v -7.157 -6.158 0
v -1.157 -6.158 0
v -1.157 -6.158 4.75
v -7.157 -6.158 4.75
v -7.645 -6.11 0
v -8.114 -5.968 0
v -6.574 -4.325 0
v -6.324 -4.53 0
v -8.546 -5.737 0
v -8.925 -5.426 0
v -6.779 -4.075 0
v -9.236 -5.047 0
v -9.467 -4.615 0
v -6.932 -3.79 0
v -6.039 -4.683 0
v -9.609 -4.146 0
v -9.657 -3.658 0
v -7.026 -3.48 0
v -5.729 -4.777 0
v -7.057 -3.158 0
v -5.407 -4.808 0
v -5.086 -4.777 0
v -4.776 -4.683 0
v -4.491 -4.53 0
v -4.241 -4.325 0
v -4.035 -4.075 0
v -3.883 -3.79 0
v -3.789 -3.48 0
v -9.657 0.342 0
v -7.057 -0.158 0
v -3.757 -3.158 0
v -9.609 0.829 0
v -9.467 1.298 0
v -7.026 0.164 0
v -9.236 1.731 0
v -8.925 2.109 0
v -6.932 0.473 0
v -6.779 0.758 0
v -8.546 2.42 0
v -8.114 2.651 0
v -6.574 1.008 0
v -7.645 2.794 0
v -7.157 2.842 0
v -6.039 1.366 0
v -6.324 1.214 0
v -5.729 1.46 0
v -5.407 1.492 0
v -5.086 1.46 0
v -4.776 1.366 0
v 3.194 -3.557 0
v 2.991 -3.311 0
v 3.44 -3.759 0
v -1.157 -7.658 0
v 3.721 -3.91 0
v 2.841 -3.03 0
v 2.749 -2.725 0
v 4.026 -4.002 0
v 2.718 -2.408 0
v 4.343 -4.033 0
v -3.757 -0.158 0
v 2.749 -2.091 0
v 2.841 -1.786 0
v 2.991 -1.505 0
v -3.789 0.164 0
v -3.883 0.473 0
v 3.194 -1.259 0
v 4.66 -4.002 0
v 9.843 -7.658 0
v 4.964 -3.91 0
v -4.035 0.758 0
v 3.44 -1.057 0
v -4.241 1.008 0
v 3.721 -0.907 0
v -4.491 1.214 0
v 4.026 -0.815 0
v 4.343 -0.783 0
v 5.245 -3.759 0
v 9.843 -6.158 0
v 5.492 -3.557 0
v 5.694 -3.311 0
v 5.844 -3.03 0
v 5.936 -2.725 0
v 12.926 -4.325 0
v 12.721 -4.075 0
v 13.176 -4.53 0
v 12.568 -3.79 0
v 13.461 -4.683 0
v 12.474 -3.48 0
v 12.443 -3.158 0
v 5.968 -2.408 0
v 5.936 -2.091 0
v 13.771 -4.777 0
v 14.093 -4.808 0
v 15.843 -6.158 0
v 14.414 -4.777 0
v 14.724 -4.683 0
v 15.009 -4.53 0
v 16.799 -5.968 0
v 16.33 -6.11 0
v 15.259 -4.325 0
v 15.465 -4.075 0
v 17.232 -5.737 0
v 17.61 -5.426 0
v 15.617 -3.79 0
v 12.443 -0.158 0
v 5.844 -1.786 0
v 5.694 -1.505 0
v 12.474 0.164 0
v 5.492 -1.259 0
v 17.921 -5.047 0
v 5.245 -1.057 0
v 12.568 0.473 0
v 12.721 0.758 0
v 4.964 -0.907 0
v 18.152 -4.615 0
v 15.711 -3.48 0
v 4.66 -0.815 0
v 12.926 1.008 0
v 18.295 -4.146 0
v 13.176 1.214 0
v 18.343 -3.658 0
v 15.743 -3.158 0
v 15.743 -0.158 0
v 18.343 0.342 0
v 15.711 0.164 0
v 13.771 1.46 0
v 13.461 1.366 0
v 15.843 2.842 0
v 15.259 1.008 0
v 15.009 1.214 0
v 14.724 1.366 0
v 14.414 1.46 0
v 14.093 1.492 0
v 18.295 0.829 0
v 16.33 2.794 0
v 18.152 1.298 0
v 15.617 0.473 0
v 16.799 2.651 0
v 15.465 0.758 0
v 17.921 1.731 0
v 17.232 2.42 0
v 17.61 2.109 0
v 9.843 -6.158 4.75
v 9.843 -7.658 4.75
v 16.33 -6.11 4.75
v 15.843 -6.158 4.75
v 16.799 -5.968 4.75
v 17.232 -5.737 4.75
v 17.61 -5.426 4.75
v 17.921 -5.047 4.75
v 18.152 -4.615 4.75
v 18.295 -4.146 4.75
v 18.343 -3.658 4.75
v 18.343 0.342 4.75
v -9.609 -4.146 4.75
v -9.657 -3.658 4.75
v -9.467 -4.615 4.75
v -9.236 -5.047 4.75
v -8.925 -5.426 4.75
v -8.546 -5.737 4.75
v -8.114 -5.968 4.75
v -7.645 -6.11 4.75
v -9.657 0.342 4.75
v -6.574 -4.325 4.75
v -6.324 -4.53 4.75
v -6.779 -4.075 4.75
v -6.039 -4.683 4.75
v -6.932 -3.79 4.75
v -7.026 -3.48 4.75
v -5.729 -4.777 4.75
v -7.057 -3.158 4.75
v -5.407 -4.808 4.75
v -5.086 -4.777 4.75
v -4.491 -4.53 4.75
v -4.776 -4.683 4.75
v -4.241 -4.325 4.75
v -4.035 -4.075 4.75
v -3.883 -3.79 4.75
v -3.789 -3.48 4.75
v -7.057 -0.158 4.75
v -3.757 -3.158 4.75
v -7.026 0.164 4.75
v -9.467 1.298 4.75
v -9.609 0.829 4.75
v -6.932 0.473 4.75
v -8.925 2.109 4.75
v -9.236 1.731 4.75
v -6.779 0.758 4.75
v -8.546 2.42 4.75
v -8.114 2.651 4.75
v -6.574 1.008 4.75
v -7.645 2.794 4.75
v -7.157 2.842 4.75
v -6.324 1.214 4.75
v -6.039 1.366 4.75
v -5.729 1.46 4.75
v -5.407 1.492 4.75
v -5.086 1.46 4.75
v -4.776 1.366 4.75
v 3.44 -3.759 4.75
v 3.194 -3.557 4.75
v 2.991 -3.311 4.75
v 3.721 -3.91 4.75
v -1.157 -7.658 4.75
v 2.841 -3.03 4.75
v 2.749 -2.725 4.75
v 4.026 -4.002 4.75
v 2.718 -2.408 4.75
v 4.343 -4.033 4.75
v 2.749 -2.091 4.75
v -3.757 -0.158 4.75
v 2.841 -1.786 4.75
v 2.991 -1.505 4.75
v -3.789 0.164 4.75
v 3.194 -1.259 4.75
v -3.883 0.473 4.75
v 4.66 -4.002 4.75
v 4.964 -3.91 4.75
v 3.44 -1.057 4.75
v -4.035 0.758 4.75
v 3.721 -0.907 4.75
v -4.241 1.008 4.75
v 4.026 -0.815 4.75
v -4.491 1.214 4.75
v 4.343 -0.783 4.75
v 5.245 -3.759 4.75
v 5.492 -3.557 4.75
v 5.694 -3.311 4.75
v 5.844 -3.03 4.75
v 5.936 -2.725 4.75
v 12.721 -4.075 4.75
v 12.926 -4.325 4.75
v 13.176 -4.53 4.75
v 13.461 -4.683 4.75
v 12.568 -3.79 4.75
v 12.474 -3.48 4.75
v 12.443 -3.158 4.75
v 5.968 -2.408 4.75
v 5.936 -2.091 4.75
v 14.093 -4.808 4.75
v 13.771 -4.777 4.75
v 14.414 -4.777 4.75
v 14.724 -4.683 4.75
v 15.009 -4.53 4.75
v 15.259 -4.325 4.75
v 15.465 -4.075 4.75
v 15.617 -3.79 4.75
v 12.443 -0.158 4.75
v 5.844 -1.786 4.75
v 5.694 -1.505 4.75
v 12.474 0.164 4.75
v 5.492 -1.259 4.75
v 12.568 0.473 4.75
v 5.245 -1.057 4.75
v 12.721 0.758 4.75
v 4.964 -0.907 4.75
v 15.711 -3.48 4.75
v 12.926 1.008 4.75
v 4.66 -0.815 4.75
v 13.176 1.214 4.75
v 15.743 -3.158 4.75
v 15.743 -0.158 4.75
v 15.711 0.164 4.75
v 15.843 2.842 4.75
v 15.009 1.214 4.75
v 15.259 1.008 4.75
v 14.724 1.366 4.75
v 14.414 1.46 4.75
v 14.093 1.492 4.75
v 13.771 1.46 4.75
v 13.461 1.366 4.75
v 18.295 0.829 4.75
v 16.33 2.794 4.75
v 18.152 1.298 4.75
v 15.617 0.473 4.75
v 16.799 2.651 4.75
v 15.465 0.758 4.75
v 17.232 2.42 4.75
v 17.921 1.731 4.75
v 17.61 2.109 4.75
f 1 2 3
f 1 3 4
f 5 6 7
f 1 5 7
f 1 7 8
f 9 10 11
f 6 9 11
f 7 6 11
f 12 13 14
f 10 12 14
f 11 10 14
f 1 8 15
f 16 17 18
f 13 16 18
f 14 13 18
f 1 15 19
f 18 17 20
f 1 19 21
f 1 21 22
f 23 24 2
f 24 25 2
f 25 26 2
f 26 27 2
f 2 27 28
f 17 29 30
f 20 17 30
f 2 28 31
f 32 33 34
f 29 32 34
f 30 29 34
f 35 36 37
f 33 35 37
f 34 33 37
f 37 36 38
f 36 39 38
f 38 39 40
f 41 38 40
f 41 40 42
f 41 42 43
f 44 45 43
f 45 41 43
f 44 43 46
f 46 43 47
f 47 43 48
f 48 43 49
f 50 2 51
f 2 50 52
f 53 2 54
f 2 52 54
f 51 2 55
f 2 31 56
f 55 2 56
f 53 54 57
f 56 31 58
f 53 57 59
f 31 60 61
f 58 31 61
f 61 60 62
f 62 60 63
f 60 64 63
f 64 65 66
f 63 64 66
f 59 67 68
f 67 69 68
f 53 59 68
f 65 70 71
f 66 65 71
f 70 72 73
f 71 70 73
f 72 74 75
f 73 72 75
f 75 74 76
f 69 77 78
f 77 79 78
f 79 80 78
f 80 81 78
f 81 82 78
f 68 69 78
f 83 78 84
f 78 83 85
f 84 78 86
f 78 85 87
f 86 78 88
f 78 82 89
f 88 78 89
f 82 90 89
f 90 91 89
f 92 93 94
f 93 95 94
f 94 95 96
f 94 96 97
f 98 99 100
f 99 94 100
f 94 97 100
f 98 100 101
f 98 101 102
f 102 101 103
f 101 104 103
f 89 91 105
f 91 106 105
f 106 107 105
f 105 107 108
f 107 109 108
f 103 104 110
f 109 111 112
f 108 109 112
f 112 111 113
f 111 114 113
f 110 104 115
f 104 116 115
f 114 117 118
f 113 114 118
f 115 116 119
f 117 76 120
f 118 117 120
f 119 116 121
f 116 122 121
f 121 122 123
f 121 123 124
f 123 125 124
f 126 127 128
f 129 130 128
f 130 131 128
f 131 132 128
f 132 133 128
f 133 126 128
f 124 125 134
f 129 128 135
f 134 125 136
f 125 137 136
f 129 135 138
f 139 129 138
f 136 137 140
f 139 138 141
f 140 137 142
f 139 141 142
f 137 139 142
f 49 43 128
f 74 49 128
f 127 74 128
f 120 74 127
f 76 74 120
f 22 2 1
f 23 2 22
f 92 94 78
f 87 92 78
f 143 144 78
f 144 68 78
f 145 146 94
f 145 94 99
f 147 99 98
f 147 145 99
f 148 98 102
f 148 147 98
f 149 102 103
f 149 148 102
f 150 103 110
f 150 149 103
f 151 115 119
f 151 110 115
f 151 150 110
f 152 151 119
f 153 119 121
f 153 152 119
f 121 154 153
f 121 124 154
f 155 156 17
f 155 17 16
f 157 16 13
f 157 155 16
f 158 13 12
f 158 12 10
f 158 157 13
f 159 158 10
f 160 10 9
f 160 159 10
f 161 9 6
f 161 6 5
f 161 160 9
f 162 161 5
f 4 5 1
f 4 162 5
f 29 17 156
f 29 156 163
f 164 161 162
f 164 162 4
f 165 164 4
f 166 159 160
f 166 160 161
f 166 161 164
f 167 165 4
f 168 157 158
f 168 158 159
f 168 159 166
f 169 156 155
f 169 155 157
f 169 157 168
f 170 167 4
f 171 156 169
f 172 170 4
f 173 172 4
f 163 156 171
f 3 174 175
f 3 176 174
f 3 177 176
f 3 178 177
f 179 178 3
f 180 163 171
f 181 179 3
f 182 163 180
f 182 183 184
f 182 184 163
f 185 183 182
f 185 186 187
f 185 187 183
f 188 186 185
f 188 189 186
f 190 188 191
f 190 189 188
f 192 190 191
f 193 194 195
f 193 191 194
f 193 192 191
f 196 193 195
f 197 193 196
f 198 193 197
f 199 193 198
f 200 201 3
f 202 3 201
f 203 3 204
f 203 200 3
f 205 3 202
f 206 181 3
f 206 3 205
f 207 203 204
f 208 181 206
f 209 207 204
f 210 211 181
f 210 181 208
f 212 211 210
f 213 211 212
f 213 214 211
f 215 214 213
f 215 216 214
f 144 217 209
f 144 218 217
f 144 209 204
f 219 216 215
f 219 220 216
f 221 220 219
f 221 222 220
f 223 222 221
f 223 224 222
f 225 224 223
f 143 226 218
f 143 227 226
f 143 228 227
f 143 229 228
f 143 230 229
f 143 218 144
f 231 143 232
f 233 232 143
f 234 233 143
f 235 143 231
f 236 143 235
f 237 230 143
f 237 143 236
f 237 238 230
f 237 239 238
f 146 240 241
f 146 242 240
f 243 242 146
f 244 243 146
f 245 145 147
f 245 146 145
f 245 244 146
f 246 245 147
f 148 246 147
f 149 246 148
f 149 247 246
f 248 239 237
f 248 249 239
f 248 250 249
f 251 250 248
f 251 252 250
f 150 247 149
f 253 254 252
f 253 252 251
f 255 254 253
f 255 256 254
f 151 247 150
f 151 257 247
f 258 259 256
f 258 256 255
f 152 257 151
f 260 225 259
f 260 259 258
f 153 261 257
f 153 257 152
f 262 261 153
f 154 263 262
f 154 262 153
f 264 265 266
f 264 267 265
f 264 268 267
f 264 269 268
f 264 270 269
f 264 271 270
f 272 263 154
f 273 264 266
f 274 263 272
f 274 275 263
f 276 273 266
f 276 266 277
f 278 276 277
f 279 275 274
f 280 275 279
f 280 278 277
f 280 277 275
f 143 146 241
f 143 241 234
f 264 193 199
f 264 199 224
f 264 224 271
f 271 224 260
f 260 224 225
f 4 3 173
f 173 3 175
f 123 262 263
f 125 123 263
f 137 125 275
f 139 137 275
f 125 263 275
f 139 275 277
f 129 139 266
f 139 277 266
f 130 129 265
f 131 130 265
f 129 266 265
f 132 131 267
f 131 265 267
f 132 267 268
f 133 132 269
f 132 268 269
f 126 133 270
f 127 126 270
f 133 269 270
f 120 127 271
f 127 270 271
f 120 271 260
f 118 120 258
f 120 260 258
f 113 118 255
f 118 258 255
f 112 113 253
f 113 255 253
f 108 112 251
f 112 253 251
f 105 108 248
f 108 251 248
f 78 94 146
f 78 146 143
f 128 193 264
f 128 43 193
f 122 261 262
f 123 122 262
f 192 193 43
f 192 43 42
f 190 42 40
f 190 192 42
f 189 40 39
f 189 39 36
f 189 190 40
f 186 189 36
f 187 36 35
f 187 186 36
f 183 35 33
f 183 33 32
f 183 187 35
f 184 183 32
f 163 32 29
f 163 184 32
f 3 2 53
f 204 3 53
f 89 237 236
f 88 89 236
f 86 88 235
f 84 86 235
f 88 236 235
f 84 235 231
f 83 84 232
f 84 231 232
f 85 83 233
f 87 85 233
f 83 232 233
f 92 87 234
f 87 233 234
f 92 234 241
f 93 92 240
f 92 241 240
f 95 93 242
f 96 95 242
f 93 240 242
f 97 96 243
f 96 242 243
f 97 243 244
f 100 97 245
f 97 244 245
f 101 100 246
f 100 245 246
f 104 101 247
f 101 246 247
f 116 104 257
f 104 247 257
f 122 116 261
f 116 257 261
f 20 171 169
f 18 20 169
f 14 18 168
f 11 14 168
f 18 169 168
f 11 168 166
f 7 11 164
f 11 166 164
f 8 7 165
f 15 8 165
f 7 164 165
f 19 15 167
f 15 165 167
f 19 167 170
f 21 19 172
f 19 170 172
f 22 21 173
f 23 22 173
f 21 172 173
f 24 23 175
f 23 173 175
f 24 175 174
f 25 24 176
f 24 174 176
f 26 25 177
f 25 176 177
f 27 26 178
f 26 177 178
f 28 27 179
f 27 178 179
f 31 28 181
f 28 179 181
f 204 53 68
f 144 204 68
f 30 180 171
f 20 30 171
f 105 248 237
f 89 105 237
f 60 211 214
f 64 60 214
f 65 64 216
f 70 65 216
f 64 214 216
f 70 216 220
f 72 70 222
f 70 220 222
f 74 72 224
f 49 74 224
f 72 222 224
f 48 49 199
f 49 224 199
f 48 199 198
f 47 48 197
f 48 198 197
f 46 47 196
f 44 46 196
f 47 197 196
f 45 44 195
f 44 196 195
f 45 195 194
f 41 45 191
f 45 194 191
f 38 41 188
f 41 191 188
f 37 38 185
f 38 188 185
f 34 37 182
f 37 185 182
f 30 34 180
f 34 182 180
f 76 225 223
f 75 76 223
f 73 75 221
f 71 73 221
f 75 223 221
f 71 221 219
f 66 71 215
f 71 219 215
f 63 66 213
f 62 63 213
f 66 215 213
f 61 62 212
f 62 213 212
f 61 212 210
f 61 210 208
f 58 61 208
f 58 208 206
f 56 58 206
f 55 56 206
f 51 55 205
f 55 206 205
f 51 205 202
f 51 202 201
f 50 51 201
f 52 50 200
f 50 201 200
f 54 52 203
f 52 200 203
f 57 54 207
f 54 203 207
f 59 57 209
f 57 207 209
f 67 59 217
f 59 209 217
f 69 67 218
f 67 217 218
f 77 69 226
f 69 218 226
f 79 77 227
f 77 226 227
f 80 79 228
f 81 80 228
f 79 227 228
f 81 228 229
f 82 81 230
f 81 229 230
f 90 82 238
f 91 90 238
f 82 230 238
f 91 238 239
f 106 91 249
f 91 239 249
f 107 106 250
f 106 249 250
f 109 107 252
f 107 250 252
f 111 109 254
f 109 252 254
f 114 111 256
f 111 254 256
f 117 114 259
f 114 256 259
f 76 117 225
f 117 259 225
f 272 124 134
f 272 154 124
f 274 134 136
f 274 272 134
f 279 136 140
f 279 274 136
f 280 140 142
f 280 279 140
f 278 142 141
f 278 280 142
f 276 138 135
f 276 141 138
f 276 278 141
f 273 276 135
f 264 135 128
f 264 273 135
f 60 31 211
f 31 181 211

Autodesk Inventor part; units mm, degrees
ref_plane "YZ Plane" through (0, 0, 0) normal (1, 0, 0) x (0, 1, 0)
ref_plane "XZ Plane" through (0, 0, 0) normal (0, 1, 0) x (-1, 0, 0)
ref_plane "XY Plane" through (0, 0, 0) normal (0, 0, 1) x (1, 0, 0)
sketch "Szkic1" plane through (0, 0, 0) normal (0, 0, 1) x (1, 0, 0)
  line L0 (-9.6574, 2.8417) -> (18.3426, 2.8417)
  line L1 (18.3426, 2.8417) -> (18.3426, -6.1583)
  line L2 (18.3426, -6.1583) -> (-9.6574, -6.1583)
  line L3 (-9.6574, -6.1583) -> (-9.6574, 2.8417)
  line L4 (-1.1574, -6.1583) -> (-1.1574, -7.6583)
  line L5 (-1.1574, -7.6583) -> (9.8426, -7.6583)
  line L6 (9.8426, -7.6583) -> (9.8426, -6.1583)
  point P0 (0, 0)
  point P1 (4.3426, -2.4083)
  dimension "d0" = 28
  dimension "d1" = 9
  dimension "d2" = 1.5
  dimension "d3" = 11
  dimension "d4" = 8.5
  dimension "d20" = 14
  dimension "d21" = 10.5
  dimension "d22" = 5.25
extrude "Wyciągnięcie proste1" add sketch "Szkic1" along normal blind 4.75
sketch "Szkic2" plane through (0, 0, 4.75) normal (0, 0, 1) x (1, 0, 0)
  line L0 (-9.6574, -6.1583) -> (-1.1574, -6.1583) projected
  line L1 (9.8426, -6.1583) -> (18.3426, -6.1583) projected
  line L2 (18.3426, 2.8417) -> (-9.6574, 2.8417) projected
  line L3 (-9.6574, 2.8417) -> (-9.6574, -6.1583) projected
  line L4 (18.3426, -6.1583) -> (18.3426, 2.8417) projected
  line L5 (14.0926, -3.1583) -> (14.0926, -0.1583) construction
  line L6 (15.7426, -3.1583) -> (15.7426, -0.1583)
  line L7 (12.4426, -0.1583) -> (12.4426, -3.1583)
  arc A0 (12.4426, -3.1583) -> (15.7426, -3.1583) centre (14.0926, -3.1583) ccw
  arc A1 (15.7426, -0.1583) -> (12.4426, -0.1583) centre (14.0926, -0.1583) ccw
  line L8 (-5.4074, -3.1583) -> (-5.4074, -0.1583) construction
  line L9 (-3.7574, -3.1583) -> (-3.7574, -0.1583)
  line L10 (-7.0574, -0.1583) -> (-7.0574, -3.1583)
  arc A2 (-7.0574, -3.1583) -> (-3.7574, -3.1583) centre (-5.4074, -3.1583) ccw
  arc A3 (-3.7574, -0.1583) -> (-7.0574, -0.1583) centre (-5.4074, -0.1583) ccw
  point P0 (0, 0)
  point P1 (-5.4074, -1.6583)
  point P2 (14.0926, -1.6583)
  dimension "d7" = 4.5
  dimension "d8" = 4.5
  dimension "d9" = 9
  dimension "d10" = 8.5
  dimension "d11" = 4.25
  dimension "d12" = 4.25
  dimension "d13" = 1.5
  dimension "d14" = 3.3
  dimension "d15" = 1.5
  dimension "d16" = 3.3
extrude "Wyciągnięcie proste2" cut sketch "Szkic2" against normal blind 10
fillet "Zaokrąglenie1" radius 2.5 4 edges at (-9.6574, 2.8417, 2.375) (-9.6574, -6.1583, 2.375) (18.3426, -6.1583, 2.375) (18.3426, 2.8417, 2.375)
hole "Otwór1" at (4.3426, -2.4083, 0) direction (0, 0, 1) diameter 3.25 end through all
equation "\"d4\" = -0.5 * d3 + 0.5 * d0"
equation "\"d20\" = 0.5 * d0"
equation "\"d22\" = 0.5 * d21"
equation "\"d7\" = 0.5 * d9"
equation "\"d8\" = d7"
equation "\"d11\" = 0.5 * d10"
equation "\"d12\" = d11"
properties part number "3DP_ABS_Extruder_Tensioning_Arm_Screw_Mount"
